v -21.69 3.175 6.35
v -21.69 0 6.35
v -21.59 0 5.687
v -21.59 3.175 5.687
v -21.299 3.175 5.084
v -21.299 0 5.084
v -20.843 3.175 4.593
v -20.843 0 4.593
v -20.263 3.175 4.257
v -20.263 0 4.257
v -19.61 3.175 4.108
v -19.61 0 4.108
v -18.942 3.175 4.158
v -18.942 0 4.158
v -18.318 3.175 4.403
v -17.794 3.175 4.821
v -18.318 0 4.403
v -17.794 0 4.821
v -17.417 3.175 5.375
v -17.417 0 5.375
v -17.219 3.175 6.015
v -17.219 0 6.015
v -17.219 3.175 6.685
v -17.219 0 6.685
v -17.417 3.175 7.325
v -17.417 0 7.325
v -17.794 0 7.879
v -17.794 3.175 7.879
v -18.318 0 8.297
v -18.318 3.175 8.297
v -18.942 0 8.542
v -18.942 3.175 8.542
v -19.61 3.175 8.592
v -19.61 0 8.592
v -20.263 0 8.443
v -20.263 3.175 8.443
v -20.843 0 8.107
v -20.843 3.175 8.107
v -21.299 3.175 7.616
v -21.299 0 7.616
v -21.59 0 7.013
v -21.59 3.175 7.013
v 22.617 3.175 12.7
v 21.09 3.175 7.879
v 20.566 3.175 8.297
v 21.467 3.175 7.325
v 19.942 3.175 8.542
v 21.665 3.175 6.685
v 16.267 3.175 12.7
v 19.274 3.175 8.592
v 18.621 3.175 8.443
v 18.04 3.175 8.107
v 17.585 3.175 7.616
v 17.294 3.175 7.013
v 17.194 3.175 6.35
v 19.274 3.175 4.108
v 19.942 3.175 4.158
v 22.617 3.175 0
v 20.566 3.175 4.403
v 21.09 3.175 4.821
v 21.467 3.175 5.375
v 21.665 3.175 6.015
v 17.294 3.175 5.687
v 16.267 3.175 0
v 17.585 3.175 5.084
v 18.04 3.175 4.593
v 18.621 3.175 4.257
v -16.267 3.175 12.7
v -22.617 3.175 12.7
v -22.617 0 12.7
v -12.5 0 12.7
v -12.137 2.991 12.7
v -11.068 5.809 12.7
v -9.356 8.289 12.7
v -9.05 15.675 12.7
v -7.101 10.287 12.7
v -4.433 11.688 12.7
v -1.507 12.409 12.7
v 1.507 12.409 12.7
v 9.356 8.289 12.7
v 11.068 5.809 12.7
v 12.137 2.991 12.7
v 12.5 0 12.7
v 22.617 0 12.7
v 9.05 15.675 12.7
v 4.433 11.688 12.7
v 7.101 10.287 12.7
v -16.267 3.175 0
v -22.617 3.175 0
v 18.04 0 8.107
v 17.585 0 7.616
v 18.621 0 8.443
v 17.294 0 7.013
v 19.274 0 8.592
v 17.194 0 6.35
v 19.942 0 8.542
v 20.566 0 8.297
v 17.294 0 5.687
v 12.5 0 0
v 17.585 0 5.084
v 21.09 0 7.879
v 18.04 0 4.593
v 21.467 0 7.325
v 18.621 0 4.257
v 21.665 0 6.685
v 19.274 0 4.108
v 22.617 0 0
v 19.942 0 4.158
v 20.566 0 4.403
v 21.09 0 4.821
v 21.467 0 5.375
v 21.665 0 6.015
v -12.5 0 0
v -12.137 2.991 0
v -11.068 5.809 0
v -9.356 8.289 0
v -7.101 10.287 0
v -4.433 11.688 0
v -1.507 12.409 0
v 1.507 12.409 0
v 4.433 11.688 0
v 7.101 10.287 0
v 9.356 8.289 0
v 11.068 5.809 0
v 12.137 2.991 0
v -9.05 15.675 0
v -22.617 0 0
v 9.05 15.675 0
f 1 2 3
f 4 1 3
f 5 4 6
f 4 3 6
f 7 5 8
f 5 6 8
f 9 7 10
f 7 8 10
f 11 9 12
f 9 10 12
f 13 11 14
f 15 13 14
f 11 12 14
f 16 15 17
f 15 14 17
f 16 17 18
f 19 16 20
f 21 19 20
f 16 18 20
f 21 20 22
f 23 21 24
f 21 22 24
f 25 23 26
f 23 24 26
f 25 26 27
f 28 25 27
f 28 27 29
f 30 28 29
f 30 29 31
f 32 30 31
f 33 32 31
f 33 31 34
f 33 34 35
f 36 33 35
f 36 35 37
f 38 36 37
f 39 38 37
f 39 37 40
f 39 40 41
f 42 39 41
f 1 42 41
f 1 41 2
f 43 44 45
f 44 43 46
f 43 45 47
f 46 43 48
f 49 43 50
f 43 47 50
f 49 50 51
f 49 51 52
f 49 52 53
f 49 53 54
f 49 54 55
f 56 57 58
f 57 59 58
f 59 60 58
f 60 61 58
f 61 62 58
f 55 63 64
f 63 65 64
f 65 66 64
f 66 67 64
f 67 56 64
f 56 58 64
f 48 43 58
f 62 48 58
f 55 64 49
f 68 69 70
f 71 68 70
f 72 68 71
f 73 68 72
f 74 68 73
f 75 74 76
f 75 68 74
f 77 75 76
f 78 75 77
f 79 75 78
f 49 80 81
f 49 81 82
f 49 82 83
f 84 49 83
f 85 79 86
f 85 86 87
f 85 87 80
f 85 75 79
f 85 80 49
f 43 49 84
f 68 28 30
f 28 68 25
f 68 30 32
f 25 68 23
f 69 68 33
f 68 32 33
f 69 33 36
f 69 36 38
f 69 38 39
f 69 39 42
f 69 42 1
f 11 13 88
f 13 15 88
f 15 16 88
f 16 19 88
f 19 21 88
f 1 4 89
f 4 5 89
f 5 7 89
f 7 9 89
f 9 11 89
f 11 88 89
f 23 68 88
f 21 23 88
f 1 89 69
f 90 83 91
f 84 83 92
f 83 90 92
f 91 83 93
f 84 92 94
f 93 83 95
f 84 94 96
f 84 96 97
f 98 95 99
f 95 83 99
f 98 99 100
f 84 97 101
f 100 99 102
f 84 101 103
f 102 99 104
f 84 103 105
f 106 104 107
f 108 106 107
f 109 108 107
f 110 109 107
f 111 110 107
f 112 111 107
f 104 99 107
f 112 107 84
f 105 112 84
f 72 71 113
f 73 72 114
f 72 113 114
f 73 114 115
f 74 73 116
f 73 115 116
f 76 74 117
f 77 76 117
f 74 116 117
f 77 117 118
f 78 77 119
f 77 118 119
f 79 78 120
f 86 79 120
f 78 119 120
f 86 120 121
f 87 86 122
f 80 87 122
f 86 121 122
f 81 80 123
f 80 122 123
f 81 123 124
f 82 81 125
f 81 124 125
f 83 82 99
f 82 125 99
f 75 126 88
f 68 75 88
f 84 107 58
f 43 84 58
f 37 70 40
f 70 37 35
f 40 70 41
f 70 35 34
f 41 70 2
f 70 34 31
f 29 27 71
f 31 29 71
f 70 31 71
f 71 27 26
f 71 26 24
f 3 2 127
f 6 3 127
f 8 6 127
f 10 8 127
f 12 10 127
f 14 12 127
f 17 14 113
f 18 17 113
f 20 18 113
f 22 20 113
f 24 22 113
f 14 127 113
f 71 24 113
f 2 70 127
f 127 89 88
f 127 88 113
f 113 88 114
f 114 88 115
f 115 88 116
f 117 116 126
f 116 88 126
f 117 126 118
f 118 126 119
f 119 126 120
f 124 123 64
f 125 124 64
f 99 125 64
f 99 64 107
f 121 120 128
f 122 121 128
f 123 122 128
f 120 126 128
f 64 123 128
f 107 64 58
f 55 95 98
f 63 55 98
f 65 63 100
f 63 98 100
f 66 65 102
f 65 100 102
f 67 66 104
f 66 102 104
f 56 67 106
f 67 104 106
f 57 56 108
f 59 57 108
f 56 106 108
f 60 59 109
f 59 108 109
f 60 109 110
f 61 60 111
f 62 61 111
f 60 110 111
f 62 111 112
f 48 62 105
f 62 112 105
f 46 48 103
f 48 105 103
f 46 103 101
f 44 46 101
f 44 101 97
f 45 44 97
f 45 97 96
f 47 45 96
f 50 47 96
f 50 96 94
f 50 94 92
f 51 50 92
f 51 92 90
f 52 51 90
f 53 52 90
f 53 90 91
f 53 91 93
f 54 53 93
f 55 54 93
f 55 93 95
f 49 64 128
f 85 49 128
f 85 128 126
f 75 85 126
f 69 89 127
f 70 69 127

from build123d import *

# Parameters (mm, degrees)
BOSS_EXTRUDE1_DEPTH       = 12.7
F_8_CLEARANCE_HOLE1_D     = 4.4958
F_8_CLEARANCE_HOLE1_DEPTH = 61.468
F_8_CLEARANCE_HOLE1_TIP   = 1.350674586


with BuildPart() as part:
    # Sketch2 → Boss-Extrude1 (new body)
    with BuildSketch(Plane.XY):
        with BuildLine():
            Line((12.5, 0), (22.616843834, 0))
            Line((22.616843834, 0), (22.616843834, 3.175))
            Line((22.616843834, 3.175), (16.266843834, 3.175))
            Line((16.266843834, 3.175), (9.04996547, 15.675))
            Line((9.04996547, 15.675), (-9.04996547, 15.675))
            Line((-9.04996547, 15.675), (-16.266843834, 3.175))
            Line((-16.266843834, 3.175), (-22.616843834, 3.175))
            Line((-22.616843834, 3.175), (-22.616843834, 0))
            Line((-22.616843834, 0), (-12.5, 0))
            ThreePointArc((-12.5, 0), (0, 12.5), (12.5, 0))
        make_face()
    extrude(amount=BOSS_EXTRUDE1_DEPTH)

    # #8 Clearance Hole1
    with Locations(Plane(origin=(0, 3.175, 0), x_dir=(1, 0, 0), z_dir=(0, 1, 0))):
        with Locations((19.441843834, -6.35), (-19.441843834, -6.35)):
            Hole(F_8_CLEARANCE_HOLE1_D / 2, depth=F_8_CLEARANCE_HOLE1_DEPTH)
            with Locations((0, 0, -(F_8_CLEARANCE_HOLE1_DEPTH + F_8_CLEARANCE_HOLE1_TIP / 2))):  # 118° drill point
                Cone(0, F_8_CLEARANCE_HOLE1_D / 2, F_8_CLEARANCE_HOLE1_TIP, mode=Mode.SUBTRACT)


solid = part.part
